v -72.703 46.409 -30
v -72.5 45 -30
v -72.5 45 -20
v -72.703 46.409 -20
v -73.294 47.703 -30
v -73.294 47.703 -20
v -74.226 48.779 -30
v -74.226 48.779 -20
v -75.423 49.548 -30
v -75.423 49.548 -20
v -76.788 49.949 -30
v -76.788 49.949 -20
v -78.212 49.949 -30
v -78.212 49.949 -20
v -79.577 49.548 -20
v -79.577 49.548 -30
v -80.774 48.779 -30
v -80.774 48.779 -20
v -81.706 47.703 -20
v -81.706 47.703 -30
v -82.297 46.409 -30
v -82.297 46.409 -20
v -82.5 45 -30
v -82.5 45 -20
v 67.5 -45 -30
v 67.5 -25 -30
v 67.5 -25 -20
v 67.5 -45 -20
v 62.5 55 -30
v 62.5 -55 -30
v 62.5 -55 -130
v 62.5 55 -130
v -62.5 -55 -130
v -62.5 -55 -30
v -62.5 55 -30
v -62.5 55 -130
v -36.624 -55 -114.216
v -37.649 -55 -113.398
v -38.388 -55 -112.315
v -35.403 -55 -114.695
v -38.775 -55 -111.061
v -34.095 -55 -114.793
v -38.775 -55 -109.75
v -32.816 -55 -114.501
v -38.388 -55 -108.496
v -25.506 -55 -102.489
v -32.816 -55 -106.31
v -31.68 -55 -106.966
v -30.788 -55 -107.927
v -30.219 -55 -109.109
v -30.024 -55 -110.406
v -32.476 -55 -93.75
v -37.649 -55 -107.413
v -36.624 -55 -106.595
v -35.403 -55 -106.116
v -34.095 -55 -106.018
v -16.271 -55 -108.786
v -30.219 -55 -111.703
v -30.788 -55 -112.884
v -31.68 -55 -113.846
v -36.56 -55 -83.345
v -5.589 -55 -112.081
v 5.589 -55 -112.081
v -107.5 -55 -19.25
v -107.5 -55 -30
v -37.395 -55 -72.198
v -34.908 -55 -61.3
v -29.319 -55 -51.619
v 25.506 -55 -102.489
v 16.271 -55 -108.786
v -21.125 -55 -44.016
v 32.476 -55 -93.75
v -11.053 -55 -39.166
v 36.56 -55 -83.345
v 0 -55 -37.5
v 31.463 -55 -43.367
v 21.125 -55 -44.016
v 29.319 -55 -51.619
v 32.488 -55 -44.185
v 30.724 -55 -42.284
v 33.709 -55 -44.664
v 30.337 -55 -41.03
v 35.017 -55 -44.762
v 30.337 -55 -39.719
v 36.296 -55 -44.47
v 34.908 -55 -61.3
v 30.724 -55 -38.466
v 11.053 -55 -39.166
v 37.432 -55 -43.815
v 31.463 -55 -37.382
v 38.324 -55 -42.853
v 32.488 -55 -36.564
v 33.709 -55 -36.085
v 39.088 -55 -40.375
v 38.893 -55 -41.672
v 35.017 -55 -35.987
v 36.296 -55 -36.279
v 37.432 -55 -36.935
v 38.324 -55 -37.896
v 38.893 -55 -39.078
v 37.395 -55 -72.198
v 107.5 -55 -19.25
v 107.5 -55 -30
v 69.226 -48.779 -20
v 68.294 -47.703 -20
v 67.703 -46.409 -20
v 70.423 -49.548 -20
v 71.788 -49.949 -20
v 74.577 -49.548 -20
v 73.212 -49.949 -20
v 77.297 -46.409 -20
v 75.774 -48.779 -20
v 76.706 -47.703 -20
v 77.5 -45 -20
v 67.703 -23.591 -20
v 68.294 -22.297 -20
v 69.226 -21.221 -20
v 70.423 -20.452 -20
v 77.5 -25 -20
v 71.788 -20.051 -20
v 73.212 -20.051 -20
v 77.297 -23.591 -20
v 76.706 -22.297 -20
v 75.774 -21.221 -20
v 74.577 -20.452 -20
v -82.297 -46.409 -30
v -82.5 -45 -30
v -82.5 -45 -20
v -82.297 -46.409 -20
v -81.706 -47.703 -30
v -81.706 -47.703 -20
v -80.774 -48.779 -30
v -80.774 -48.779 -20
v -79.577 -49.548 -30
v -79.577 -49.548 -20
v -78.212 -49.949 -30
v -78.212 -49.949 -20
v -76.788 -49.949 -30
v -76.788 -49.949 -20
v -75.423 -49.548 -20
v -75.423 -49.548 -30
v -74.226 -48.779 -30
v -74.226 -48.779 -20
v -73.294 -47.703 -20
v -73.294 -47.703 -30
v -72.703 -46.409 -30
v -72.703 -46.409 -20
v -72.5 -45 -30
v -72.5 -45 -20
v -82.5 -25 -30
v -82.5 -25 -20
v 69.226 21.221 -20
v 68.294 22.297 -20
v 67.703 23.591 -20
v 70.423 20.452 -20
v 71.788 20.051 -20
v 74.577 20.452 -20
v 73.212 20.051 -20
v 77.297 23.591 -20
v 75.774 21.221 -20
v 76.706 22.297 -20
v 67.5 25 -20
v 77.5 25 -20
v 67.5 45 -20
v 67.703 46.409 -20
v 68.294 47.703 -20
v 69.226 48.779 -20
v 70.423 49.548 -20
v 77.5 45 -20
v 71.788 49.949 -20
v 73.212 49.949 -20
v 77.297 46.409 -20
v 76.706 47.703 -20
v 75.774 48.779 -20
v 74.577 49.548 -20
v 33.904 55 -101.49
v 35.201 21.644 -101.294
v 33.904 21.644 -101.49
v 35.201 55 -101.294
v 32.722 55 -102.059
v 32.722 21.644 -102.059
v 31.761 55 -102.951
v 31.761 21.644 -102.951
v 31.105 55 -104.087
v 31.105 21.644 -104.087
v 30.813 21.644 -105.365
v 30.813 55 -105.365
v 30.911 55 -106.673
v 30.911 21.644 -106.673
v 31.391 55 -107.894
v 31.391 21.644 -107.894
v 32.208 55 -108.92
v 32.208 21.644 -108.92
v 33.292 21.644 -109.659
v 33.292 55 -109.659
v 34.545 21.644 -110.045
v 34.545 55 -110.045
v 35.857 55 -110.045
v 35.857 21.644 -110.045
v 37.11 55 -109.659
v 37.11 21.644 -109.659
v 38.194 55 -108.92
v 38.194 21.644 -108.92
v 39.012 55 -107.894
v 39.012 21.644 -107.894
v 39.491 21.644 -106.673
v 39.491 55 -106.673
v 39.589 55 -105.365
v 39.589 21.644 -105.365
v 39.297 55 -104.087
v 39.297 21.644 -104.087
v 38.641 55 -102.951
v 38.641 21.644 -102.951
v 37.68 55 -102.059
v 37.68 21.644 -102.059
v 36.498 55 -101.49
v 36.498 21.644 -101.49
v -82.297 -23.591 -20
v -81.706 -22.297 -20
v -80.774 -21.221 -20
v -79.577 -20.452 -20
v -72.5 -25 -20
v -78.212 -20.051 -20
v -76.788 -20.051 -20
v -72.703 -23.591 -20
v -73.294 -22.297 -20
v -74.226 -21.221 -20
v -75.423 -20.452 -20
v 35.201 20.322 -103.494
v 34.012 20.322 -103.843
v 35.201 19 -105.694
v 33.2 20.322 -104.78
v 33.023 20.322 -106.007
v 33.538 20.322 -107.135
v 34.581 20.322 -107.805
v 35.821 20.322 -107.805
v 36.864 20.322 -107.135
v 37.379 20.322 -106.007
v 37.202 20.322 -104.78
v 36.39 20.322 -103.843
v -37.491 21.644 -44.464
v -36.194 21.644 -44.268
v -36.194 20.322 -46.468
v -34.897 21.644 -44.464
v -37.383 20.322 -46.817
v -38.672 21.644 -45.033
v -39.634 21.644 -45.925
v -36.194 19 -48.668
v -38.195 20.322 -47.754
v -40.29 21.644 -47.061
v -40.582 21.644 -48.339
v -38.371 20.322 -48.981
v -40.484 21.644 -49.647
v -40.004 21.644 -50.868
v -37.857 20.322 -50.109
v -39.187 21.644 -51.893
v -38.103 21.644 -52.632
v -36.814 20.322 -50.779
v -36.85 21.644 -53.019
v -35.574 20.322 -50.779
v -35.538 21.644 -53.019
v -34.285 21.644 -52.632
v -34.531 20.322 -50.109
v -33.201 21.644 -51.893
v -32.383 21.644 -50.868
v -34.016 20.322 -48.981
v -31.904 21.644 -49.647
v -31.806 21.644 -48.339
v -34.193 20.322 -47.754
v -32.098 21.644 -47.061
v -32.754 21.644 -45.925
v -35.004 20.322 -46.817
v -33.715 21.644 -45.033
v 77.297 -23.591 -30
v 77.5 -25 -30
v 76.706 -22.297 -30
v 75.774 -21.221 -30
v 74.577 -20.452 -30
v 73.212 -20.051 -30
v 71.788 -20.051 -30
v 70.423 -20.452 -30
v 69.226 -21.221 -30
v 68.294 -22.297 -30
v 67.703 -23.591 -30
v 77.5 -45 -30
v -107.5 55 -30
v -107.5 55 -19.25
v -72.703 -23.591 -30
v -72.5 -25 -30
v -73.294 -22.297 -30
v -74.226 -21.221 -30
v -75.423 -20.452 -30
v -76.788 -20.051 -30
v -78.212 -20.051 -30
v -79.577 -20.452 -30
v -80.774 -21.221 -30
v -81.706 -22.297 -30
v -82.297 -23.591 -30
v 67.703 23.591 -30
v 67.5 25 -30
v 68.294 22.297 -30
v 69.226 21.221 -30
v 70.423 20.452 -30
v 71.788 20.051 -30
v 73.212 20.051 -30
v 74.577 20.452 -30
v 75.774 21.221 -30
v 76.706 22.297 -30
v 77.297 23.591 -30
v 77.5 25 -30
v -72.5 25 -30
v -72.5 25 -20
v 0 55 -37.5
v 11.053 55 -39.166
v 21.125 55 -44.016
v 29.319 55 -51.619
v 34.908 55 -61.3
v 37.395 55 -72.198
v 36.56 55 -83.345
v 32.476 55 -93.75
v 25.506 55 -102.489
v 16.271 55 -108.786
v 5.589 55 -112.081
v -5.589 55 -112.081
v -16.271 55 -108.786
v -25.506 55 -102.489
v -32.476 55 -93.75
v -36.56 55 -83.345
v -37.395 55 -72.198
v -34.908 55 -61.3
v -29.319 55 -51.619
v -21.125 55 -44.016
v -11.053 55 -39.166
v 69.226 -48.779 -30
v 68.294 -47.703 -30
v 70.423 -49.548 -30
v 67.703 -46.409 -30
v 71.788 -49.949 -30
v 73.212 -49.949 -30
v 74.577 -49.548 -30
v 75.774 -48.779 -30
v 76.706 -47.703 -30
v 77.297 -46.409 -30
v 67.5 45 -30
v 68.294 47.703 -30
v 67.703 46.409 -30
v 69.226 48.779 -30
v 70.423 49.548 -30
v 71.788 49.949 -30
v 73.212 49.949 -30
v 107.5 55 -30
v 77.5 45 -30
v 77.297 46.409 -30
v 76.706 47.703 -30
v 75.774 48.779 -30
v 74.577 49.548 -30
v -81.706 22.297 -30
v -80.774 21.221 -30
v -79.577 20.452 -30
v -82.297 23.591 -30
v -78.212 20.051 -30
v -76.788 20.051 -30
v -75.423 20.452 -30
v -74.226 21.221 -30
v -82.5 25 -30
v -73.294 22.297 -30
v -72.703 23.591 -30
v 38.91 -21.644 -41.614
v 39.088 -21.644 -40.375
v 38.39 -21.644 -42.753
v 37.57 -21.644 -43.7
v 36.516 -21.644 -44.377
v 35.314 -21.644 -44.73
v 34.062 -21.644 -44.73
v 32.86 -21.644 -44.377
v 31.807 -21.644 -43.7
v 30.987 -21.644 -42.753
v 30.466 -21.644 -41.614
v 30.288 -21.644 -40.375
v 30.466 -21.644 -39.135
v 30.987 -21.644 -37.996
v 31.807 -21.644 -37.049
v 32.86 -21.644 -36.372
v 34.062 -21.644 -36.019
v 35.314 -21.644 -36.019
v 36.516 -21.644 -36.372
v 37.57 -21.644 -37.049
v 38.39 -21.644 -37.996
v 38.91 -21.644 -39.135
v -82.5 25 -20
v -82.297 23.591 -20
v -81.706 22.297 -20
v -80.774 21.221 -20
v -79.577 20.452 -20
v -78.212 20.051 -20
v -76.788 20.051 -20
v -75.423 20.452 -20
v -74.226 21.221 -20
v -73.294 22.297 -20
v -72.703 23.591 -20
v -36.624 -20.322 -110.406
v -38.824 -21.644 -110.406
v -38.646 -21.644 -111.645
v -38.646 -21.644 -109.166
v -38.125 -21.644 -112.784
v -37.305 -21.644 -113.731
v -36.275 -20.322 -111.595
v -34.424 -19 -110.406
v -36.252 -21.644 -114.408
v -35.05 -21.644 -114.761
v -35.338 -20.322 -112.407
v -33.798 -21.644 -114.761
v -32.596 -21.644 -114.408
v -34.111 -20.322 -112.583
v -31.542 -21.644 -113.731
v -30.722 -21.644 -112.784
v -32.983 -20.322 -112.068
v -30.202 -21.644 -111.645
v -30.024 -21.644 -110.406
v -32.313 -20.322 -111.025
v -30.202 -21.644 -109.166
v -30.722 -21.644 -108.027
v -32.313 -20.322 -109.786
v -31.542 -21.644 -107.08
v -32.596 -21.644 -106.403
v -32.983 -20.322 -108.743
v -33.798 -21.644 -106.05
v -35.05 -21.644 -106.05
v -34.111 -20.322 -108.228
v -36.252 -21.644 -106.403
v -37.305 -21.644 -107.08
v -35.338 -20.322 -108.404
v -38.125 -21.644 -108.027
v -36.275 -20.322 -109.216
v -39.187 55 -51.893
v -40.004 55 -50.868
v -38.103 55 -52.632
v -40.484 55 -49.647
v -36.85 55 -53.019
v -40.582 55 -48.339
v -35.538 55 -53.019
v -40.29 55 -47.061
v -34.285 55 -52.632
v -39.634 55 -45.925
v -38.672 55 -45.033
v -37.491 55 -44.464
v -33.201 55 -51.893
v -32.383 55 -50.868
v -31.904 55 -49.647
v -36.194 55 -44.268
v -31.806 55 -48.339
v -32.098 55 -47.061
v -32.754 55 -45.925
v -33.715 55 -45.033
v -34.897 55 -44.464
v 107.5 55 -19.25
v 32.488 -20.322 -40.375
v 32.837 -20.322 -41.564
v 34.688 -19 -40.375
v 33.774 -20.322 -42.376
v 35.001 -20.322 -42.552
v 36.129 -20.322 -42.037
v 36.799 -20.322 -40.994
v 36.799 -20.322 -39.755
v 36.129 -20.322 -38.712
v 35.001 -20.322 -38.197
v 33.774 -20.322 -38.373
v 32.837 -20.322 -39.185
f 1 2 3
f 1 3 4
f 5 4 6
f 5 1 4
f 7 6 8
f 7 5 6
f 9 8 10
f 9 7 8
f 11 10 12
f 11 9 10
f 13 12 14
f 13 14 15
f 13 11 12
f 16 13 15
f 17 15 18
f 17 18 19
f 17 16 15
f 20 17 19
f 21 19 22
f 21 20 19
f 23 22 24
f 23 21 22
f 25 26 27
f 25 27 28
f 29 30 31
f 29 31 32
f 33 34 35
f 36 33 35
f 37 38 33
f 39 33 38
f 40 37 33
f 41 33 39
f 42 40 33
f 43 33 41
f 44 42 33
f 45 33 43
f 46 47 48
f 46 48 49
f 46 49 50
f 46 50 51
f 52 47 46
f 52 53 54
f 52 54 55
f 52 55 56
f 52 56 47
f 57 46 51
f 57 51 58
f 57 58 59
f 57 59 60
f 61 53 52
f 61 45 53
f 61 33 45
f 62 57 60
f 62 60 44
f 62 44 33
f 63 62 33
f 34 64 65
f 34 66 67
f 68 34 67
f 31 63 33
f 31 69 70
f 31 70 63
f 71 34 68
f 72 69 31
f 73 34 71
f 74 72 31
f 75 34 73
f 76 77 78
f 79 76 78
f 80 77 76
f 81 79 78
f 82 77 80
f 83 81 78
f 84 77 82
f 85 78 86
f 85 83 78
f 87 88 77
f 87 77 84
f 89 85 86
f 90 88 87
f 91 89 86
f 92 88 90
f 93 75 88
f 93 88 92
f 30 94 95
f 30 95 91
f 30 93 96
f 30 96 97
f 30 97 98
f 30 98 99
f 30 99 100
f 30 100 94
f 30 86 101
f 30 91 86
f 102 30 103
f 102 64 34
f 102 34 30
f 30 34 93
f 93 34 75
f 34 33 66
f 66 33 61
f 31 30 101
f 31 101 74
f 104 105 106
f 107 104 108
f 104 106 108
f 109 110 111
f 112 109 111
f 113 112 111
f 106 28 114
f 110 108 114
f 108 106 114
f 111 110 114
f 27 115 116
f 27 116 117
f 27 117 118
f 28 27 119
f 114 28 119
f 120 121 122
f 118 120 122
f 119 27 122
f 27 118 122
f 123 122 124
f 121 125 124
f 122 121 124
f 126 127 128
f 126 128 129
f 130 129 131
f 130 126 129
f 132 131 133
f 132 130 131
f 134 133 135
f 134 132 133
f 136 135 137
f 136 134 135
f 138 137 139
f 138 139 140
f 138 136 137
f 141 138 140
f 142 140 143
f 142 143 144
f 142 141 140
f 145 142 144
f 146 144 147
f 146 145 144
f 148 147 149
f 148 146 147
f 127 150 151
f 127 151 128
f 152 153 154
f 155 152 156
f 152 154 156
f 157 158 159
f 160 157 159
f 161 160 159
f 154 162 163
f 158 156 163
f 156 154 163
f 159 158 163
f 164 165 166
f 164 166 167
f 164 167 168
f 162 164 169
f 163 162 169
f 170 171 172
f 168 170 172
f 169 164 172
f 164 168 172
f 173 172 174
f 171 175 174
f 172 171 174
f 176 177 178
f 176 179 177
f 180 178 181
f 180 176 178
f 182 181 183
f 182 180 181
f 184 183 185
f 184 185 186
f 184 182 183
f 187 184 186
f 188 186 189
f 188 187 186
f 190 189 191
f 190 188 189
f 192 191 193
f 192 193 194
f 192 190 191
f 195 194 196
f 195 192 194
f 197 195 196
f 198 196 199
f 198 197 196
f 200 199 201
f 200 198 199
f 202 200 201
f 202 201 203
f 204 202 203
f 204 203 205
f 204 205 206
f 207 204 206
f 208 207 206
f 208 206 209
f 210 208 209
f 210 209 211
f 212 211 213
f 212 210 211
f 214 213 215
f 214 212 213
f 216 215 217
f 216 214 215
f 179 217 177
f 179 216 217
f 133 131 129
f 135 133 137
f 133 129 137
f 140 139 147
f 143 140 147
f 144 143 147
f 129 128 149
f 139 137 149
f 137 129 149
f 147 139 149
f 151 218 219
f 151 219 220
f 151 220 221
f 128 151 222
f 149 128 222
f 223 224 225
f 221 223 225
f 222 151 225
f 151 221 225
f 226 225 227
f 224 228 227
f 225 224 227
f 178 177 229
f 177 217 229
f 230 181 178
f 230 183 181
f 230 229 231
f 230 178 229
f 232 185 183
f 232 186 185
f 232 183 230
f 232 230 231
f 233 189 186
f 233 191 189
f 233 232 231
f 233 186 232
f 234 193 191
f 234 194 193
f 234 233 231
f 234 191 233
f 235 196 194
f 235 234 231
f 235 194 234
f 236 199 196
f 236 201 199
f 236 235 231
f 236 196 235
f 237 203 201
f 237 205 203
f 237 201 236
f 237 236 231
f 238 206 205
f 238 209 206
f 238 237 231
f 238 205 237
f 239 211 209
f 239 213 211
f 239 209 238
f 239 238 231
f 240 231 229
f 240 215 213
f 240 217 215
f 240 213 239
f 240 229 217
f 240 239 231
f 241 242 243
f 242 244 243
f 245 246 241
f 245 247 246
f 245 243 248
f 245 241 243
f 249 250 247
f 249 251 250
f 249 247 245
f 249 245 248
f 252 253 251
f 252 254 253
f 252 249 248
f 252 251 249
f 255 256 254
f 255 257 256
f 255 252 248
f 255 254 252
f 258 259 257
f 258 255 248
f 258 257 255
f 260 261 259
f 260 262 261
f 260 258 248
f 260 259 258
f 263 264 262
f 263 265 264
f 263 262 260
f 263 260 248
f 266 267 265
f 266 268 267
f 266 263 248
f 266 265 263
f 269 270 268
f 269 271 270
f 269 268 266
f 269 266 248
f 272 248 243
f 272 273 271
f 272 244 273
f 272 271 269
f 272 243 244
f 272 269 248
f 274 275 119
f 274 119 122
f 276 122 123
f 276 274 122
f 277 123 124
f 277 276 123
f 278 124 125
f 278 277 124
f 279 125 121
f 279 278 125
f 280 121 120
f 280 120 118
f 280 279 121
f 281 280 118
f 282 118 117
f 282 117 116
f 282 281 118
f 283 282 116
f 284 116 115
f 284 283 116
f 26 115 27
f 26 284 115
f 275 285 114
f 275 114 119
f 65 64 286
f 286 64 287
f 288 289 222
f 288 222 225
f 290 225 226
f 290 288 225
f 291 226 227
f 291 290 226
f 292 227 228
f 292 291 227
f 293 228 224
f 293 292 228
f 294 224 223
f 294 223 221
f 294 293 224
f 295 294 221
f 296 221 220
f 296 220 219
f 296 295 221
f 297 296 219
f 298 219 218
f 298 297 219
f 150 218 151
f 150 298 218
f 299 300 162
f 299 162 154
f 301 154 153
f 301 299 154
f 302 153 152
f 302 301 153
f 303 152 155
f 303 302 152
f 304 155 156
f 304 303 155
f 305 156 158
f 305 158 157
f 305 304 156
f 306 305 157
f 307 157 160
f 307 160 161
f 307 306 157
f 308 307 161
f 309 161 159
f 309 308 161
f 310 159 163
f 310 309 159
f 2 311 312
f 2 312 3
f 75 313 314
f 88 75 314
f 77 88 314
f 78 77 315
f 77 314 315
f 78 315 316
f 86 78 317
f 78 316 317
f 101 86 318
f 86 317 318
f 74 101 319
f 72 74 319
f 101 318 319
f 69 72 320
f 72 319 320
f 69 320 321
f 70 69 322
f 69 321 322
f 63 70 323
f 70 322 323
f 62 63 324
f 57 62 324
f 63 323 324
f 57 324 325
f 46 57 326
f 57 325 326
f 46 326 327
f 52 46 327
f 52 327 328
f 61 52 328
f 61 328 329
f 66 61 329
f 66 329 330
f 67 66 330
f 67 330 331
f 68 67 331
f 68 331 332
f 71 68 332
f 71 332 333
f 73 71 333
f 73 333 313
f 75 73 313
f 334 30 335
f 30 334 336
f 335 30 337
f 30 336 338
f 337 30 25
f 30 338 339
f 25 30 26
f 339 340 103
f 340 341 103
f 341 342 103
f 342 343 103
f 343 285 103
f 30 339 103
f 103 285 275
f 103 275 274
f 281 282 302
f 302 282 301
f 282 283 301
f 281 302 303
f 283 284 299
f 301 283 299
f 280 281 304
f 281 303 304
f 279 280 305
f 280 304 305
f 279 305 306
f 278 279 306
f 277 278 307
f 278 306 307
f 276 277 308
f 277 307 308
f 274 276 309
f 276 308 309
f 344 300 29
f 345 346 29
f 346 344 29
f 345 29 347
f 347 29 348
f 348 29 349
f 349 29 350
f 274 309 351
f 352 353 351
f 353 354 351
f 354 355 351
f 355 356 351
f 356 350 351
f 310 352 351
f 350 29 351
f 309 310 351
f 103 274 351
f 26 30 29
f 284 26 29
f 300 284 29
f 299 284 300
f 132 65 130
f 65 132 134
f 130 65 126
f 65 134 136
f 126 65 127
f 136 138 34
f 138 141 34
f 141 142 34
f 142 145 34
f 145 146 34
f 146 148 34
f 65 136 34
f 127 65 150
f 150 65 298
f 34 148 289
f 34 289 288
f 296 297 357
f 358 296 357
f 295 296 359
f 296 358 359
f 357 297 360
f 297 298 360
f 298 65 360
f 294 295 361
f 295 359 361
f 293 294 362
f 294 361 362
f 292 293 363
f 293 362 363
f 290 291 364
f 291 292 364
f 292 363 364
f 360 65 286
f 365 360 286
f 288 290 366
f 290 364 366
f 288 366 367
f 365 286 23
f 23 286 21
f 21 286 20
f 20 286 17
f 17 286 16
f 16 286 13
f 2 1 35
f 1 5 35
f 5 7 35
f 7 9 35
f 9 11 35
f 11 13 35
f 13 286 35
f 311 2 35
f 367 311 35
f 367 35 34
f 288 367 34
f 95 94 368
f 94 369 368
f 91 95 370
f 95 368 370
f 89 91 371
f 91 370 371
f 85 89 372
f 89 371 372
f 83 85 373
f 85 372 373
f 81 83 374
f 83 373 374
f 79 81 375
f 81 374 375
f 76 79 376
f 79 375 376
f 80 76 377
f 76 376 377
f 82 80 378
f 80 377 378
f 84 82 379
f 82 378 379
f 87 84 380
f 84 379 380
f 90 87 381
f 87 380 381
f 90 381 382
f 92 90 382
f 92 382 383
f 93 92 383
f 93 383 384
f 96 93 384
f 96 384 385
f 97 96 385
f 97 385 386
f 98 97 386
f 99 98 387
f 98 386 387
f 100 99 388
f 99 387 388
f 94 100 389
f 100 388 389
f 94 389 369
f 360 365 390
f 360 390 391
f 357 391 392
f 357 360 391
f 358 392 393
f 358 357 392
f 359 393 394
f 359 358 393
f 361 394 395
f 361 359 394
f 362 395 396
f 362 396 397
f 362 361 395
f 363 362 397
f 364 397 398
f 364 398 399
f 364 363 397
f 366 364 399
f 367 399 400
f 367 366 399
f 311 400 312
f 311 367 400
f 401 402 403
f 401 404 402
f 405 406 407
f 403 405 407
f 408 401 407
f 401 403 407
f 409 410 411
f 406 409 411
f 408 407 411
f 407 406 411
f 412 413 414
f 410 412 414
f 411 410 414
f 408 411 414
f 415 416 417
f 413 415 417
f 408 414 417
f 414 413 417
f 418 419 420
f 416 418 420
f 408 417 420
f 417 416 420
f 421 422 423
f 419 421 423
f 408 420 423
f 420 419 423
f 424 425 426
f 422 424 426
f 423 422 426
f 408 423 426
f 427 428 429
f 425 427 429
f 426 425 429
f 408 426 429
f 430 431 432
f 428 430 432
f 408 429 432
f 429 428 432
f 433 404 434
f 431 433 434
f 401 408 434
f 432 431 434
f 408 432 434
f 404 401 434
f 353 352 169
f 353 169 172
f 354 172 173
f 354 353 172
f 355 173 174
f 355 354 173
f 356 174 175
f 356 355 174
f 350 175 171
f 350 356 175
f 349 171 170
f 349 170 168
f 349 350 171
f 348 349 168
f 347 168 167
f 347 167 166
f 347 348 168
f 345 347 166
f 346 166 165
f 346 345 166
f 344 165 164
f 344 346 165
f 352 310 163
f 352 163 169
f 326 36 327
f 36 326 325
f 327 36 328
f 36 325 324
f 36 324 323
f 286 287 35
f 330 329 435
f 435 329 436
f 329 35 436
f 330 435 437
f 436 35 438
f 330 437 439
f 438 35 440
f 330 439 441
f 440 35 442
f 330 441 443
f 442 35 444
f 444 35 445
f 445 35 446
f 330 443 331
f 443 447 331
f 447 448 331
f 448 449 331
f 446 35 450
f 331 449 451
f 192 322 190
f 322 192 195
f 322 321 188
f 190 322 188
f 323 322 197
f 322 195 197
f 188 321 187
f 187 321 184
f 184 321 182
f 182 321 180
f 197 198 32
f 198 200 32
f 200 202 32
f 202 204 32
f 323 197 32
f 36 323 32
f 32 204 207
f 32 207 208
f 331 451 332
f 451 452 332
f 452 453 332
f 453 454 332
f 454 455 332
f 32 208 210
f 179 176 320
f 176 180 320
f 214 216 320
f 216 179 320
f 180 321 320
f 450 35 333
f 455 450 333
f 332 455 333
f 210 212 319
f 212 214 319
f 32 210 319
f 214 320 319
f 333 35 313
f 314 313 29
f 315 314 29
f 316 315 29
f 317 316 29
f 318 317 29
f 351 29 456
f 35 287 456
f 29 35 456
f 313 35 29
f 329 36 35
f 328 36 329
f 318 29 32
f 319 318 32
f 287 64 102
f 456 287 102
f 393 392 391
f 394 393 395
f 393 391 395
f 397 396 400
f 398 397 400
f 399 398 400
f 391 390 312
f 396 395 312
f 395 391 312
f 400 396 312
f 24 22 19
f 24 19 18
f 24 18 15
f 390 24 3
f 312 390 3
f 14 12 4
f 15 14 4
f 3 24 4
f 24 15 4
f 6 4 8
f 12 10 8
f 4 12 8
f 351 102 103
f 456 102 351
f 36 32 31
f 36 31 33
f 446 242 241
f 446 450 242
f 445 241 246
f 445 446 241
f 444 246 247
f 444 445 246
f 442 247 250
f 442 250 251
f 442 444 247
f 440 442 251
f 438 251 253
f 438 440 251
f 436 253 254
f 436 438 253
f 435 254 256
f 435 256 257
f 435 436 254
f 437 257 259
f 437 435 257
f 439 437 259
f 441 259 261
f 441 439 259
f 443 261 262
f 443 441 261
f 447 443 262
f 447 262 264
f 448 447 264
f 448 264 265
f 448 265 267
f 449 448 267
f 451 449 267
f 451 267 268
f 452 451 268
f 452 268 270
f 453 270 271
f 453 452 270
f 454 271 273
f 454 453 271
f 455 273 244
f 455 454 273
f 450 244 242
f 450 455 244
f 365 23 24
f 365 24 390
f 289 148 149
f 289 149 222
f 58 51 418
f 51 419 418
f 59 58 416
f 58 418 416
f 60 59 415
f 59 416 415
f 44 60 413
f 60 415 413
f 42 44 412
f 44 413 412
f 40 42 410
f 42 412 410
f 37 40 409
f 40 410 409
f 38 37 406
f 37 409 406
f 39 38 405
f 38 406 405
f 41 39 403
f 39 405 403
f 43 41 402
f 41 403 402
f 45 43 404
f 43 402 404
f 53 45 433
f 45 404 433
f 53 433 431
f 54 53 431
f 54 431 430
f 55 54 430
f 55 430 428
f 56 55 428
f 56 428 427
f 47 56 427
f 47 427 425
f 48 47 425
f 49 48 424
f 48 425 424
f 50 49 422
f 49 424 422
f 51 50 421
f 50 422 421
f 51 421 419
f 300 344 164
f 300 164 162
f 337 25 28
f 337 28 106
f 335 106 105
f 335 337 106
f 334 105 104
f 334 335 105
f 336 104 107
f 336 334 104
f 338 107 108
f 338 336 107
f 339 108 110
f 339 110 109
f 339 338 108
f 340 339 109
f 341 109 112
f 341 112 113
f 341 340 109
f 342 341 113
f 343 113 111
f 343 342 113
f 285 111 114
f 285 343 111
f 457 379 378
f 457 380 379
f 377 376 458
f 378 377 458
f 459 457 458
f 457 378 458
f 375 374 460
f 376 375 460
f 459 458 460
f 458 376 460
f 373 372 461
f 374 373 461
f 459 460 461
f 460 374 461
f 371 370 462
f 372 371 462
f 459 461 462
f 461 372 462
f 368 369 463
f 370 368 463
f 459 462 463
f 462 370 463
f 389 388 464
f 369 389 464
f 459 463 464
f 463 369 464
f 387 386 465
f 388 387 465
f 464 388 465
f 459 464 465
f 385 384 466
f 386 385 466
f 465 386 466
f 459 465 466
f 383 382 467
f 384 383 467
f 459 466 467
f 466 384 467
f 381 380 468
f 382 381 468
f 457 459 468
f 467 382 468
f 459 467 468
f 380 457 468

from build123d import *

# Parameters (mm, degrees)
SKETCH_2_W             = 215
SKETCH_2_H             = 110
EXTRUDE_1_DEPTH        = 30
SKETCH_3_W             = 125
SKETCH_3_H             = 110
EXTRUDE_2_DEPTH        = 100
SKETCH_4_R             = 37.5
CUT_EXTRUDE_1_DEPTH    = 202.385823731
M10X1_25_2_AT_2_COUNT  = 2
M10X1_25_2_AT_2_PITCH  = 91.374081536
PATTERN_LINEAR_1_COUNT = 2
PATTERN_LINEAR_1_PITCH = 110
CUT_EXTRUDE_9_DEPTH    = 10
M10X1_25_4_D           = 8.8
M10X1_25_4_DEPTH       = 33.356213276
M10X1_25_4_TIP         = 2.643786724
SKETCH_28_W            = 215
SKETCH_28_H            = 19.25
CUT_EXTRUDE_11_DEPTH   = 110


with BuildPart() as part:
    # 草图2 → 凸台-拉伸1 (new body)
    with BuildSketch(Plane.XY):
        Rectangle(SKETCH_2_W, SKETCH_2_H)
    extrude(amount=-EXTRUDE_1_DEPTH)

    # 草图3 → 凸台-拉伸2 (add)
    with BuildSketch(Plane(origin=(0, 0, -30), x_dir=(-1, 0, 0), z_dir=(0, 0, -1))):
        Rectangle(SKETCH_3_W, SKETCH_3_H)
    extrude(amount=EXTRUDE_2_DEPTH)

    # 草图4 → 切除-拉伸1 (cut, through all)
    with BuildSketch(Plane(origin=(0, 55, 0), x_dir=(1, 0, 0), z_dir=(0, 1, 0))):
        with Locations(Location((0, 75, 0), (0, 0, 270))):
            Circle(SKETCH_4_R)
    extrude(amount=-CUT_EXTRUDE_1_DEPTH, mode=Mode.SUBTRACT)

    # 草图9 → M10x1.25 螺纹孔2 (revolve, cut)
    with BuildSketch(Plane(origin=(-36.193891144, 55, -48.668021168), x_dir=(0, 0, 1), z_dir=(1, 0, 0))):
        Polygon((0, 0), (0, 36), (4.4, 33.356213276), (4.4, 0), align=None)
    m10x1_25_2 = revolve(axis=Axis((-36.193891144, 61.35, -48.668021168), (0, -1, 0)), mode=Mode.SUBTRACT)

    # M10x1.25 螺纹孔2 at 2: M10x1.25 螺纹孔2 ×2
    with Locations(*[Vector(0.7813475015769275, 0, -0.624096211957334) * (i * M10X1_25_2_AT_2_PITCH) for i in range(1, M10X1_25_2_AT_2_COUNT)]):
        add(m10x1_25_2, mode=Mode.SUBTRACT)

    # 阵列(线性)1: M10x1.25 螺纹孔2 ×2
    with Locations(*[(0, i * PATTERN_LINEAR_1_PITCH, 0) for i in range(1, PATTERN_LINEAR_1_COUNT)]):
        add(m10x1_25_2, mode=Mode.SUBTRACT)

    # 阵列(线性)1 copy 1 sketch → 阵列(线性)1 copy 1 (revolve, cut)
    with BuildSketch(Plane(origin=(35.201019173, 165, -105.694239325), x_dir=(0, 0, 1), z_dir=(1, 0, 0))):
        Polygon((0, 0), (0, 36), (4.4, 33.356213276), (4.4, 0), align=None)
    revolve(axis=Axis((35.201019173, 171.35, -105.694239325), (0, -1, 0)), mode=Mode.SUBTRACT)

    # 草图14 → 切除-拉伸9 (cut)
    with BuildSketch(Plane(origin=(0, 0, -30), x_dir=(-1, 0, 0), z_dir=(0, 0, -1))):
        with BuildLine():
            Line((82.5, 45), (82.5, 25))
            ThreePointArc((82.5, 25), (77.5, 20), (72.5, 25))
            Line((72.5, 25), (72.5, 45))
            ThreePointArc((72.5, 45), (77.5, 50), (82.5, 45))
        make_face()
        with BuildLine():
            Line((-67.5, 45), (-67.5, 25))
            ThreePointArc((-67.5, 25), (-72.5, 20), (-77.5, 25))
            Line((-77.5, 25), (-77.5, 45))
            ThreePointArc((-77.5, 45), (-72.5, 50), (-67.5, 45))
        make_face()
        with BuildLine():
            Line((82.5, -25), (82.5, -45))
            ThreePointArc((82.5, -45), (77.5, -50), (72.5, -45))
            Line((72.5, -45), (72.5, -25))
            ThreePointArc((72.5, -25), (77.5, -20), (82.5, -25))
        make_face()
        with BuildLine():
            Line((-67.5, -25), (-67.5, -45))
            ThreePointArc((-67.5, -45), (-72.5, -50), (-77.5, -45))
            Line((-77.5, -45), (-77.5, -25))
            ThreePointArc((-77.5, -25), (-72.5, -20), (-67.5, -25))
        make_face()
    extrude(amount=-CUT_EXTRUDE_9_DEPTH, mode=Mode.SUBTRACT)

    # M10x1.25 螺纹孔4
    with Locations(Plane(origin=(0, -55, 0), x_dir=(-1, 0, 0), z_dir=(0, -1, 0))):
        with Locations((-34.688229548, 40.374629495), (34.423841578, 110.405583489)):
            Hole(M10X1_25_4_D / 2, depth=M10X1_25_4_DEPTH)
            with Locations((0, 0, -(M10X1_25_4_DEPTH + M10X1_25_4_TIP / 2))):  # 118° drill point
                Cone(0, M10X1_25_4_D / 2, M10X1_25_4_TIP, mode=Mode.SUBTRACT)

    # 草图28 → 切除-拉伸11 (cut)
    with BuildSketch(Plane.XZ.offset(55)):
        with Locations((0, -9.625)):
            Rectangle(SKETCH_28_W, SKETCH_28_H)
    extrude(amount=-CUT_EXTRUDE_11_DEPTH, mode=Mode.SUBTRACT)


solid = part.part
